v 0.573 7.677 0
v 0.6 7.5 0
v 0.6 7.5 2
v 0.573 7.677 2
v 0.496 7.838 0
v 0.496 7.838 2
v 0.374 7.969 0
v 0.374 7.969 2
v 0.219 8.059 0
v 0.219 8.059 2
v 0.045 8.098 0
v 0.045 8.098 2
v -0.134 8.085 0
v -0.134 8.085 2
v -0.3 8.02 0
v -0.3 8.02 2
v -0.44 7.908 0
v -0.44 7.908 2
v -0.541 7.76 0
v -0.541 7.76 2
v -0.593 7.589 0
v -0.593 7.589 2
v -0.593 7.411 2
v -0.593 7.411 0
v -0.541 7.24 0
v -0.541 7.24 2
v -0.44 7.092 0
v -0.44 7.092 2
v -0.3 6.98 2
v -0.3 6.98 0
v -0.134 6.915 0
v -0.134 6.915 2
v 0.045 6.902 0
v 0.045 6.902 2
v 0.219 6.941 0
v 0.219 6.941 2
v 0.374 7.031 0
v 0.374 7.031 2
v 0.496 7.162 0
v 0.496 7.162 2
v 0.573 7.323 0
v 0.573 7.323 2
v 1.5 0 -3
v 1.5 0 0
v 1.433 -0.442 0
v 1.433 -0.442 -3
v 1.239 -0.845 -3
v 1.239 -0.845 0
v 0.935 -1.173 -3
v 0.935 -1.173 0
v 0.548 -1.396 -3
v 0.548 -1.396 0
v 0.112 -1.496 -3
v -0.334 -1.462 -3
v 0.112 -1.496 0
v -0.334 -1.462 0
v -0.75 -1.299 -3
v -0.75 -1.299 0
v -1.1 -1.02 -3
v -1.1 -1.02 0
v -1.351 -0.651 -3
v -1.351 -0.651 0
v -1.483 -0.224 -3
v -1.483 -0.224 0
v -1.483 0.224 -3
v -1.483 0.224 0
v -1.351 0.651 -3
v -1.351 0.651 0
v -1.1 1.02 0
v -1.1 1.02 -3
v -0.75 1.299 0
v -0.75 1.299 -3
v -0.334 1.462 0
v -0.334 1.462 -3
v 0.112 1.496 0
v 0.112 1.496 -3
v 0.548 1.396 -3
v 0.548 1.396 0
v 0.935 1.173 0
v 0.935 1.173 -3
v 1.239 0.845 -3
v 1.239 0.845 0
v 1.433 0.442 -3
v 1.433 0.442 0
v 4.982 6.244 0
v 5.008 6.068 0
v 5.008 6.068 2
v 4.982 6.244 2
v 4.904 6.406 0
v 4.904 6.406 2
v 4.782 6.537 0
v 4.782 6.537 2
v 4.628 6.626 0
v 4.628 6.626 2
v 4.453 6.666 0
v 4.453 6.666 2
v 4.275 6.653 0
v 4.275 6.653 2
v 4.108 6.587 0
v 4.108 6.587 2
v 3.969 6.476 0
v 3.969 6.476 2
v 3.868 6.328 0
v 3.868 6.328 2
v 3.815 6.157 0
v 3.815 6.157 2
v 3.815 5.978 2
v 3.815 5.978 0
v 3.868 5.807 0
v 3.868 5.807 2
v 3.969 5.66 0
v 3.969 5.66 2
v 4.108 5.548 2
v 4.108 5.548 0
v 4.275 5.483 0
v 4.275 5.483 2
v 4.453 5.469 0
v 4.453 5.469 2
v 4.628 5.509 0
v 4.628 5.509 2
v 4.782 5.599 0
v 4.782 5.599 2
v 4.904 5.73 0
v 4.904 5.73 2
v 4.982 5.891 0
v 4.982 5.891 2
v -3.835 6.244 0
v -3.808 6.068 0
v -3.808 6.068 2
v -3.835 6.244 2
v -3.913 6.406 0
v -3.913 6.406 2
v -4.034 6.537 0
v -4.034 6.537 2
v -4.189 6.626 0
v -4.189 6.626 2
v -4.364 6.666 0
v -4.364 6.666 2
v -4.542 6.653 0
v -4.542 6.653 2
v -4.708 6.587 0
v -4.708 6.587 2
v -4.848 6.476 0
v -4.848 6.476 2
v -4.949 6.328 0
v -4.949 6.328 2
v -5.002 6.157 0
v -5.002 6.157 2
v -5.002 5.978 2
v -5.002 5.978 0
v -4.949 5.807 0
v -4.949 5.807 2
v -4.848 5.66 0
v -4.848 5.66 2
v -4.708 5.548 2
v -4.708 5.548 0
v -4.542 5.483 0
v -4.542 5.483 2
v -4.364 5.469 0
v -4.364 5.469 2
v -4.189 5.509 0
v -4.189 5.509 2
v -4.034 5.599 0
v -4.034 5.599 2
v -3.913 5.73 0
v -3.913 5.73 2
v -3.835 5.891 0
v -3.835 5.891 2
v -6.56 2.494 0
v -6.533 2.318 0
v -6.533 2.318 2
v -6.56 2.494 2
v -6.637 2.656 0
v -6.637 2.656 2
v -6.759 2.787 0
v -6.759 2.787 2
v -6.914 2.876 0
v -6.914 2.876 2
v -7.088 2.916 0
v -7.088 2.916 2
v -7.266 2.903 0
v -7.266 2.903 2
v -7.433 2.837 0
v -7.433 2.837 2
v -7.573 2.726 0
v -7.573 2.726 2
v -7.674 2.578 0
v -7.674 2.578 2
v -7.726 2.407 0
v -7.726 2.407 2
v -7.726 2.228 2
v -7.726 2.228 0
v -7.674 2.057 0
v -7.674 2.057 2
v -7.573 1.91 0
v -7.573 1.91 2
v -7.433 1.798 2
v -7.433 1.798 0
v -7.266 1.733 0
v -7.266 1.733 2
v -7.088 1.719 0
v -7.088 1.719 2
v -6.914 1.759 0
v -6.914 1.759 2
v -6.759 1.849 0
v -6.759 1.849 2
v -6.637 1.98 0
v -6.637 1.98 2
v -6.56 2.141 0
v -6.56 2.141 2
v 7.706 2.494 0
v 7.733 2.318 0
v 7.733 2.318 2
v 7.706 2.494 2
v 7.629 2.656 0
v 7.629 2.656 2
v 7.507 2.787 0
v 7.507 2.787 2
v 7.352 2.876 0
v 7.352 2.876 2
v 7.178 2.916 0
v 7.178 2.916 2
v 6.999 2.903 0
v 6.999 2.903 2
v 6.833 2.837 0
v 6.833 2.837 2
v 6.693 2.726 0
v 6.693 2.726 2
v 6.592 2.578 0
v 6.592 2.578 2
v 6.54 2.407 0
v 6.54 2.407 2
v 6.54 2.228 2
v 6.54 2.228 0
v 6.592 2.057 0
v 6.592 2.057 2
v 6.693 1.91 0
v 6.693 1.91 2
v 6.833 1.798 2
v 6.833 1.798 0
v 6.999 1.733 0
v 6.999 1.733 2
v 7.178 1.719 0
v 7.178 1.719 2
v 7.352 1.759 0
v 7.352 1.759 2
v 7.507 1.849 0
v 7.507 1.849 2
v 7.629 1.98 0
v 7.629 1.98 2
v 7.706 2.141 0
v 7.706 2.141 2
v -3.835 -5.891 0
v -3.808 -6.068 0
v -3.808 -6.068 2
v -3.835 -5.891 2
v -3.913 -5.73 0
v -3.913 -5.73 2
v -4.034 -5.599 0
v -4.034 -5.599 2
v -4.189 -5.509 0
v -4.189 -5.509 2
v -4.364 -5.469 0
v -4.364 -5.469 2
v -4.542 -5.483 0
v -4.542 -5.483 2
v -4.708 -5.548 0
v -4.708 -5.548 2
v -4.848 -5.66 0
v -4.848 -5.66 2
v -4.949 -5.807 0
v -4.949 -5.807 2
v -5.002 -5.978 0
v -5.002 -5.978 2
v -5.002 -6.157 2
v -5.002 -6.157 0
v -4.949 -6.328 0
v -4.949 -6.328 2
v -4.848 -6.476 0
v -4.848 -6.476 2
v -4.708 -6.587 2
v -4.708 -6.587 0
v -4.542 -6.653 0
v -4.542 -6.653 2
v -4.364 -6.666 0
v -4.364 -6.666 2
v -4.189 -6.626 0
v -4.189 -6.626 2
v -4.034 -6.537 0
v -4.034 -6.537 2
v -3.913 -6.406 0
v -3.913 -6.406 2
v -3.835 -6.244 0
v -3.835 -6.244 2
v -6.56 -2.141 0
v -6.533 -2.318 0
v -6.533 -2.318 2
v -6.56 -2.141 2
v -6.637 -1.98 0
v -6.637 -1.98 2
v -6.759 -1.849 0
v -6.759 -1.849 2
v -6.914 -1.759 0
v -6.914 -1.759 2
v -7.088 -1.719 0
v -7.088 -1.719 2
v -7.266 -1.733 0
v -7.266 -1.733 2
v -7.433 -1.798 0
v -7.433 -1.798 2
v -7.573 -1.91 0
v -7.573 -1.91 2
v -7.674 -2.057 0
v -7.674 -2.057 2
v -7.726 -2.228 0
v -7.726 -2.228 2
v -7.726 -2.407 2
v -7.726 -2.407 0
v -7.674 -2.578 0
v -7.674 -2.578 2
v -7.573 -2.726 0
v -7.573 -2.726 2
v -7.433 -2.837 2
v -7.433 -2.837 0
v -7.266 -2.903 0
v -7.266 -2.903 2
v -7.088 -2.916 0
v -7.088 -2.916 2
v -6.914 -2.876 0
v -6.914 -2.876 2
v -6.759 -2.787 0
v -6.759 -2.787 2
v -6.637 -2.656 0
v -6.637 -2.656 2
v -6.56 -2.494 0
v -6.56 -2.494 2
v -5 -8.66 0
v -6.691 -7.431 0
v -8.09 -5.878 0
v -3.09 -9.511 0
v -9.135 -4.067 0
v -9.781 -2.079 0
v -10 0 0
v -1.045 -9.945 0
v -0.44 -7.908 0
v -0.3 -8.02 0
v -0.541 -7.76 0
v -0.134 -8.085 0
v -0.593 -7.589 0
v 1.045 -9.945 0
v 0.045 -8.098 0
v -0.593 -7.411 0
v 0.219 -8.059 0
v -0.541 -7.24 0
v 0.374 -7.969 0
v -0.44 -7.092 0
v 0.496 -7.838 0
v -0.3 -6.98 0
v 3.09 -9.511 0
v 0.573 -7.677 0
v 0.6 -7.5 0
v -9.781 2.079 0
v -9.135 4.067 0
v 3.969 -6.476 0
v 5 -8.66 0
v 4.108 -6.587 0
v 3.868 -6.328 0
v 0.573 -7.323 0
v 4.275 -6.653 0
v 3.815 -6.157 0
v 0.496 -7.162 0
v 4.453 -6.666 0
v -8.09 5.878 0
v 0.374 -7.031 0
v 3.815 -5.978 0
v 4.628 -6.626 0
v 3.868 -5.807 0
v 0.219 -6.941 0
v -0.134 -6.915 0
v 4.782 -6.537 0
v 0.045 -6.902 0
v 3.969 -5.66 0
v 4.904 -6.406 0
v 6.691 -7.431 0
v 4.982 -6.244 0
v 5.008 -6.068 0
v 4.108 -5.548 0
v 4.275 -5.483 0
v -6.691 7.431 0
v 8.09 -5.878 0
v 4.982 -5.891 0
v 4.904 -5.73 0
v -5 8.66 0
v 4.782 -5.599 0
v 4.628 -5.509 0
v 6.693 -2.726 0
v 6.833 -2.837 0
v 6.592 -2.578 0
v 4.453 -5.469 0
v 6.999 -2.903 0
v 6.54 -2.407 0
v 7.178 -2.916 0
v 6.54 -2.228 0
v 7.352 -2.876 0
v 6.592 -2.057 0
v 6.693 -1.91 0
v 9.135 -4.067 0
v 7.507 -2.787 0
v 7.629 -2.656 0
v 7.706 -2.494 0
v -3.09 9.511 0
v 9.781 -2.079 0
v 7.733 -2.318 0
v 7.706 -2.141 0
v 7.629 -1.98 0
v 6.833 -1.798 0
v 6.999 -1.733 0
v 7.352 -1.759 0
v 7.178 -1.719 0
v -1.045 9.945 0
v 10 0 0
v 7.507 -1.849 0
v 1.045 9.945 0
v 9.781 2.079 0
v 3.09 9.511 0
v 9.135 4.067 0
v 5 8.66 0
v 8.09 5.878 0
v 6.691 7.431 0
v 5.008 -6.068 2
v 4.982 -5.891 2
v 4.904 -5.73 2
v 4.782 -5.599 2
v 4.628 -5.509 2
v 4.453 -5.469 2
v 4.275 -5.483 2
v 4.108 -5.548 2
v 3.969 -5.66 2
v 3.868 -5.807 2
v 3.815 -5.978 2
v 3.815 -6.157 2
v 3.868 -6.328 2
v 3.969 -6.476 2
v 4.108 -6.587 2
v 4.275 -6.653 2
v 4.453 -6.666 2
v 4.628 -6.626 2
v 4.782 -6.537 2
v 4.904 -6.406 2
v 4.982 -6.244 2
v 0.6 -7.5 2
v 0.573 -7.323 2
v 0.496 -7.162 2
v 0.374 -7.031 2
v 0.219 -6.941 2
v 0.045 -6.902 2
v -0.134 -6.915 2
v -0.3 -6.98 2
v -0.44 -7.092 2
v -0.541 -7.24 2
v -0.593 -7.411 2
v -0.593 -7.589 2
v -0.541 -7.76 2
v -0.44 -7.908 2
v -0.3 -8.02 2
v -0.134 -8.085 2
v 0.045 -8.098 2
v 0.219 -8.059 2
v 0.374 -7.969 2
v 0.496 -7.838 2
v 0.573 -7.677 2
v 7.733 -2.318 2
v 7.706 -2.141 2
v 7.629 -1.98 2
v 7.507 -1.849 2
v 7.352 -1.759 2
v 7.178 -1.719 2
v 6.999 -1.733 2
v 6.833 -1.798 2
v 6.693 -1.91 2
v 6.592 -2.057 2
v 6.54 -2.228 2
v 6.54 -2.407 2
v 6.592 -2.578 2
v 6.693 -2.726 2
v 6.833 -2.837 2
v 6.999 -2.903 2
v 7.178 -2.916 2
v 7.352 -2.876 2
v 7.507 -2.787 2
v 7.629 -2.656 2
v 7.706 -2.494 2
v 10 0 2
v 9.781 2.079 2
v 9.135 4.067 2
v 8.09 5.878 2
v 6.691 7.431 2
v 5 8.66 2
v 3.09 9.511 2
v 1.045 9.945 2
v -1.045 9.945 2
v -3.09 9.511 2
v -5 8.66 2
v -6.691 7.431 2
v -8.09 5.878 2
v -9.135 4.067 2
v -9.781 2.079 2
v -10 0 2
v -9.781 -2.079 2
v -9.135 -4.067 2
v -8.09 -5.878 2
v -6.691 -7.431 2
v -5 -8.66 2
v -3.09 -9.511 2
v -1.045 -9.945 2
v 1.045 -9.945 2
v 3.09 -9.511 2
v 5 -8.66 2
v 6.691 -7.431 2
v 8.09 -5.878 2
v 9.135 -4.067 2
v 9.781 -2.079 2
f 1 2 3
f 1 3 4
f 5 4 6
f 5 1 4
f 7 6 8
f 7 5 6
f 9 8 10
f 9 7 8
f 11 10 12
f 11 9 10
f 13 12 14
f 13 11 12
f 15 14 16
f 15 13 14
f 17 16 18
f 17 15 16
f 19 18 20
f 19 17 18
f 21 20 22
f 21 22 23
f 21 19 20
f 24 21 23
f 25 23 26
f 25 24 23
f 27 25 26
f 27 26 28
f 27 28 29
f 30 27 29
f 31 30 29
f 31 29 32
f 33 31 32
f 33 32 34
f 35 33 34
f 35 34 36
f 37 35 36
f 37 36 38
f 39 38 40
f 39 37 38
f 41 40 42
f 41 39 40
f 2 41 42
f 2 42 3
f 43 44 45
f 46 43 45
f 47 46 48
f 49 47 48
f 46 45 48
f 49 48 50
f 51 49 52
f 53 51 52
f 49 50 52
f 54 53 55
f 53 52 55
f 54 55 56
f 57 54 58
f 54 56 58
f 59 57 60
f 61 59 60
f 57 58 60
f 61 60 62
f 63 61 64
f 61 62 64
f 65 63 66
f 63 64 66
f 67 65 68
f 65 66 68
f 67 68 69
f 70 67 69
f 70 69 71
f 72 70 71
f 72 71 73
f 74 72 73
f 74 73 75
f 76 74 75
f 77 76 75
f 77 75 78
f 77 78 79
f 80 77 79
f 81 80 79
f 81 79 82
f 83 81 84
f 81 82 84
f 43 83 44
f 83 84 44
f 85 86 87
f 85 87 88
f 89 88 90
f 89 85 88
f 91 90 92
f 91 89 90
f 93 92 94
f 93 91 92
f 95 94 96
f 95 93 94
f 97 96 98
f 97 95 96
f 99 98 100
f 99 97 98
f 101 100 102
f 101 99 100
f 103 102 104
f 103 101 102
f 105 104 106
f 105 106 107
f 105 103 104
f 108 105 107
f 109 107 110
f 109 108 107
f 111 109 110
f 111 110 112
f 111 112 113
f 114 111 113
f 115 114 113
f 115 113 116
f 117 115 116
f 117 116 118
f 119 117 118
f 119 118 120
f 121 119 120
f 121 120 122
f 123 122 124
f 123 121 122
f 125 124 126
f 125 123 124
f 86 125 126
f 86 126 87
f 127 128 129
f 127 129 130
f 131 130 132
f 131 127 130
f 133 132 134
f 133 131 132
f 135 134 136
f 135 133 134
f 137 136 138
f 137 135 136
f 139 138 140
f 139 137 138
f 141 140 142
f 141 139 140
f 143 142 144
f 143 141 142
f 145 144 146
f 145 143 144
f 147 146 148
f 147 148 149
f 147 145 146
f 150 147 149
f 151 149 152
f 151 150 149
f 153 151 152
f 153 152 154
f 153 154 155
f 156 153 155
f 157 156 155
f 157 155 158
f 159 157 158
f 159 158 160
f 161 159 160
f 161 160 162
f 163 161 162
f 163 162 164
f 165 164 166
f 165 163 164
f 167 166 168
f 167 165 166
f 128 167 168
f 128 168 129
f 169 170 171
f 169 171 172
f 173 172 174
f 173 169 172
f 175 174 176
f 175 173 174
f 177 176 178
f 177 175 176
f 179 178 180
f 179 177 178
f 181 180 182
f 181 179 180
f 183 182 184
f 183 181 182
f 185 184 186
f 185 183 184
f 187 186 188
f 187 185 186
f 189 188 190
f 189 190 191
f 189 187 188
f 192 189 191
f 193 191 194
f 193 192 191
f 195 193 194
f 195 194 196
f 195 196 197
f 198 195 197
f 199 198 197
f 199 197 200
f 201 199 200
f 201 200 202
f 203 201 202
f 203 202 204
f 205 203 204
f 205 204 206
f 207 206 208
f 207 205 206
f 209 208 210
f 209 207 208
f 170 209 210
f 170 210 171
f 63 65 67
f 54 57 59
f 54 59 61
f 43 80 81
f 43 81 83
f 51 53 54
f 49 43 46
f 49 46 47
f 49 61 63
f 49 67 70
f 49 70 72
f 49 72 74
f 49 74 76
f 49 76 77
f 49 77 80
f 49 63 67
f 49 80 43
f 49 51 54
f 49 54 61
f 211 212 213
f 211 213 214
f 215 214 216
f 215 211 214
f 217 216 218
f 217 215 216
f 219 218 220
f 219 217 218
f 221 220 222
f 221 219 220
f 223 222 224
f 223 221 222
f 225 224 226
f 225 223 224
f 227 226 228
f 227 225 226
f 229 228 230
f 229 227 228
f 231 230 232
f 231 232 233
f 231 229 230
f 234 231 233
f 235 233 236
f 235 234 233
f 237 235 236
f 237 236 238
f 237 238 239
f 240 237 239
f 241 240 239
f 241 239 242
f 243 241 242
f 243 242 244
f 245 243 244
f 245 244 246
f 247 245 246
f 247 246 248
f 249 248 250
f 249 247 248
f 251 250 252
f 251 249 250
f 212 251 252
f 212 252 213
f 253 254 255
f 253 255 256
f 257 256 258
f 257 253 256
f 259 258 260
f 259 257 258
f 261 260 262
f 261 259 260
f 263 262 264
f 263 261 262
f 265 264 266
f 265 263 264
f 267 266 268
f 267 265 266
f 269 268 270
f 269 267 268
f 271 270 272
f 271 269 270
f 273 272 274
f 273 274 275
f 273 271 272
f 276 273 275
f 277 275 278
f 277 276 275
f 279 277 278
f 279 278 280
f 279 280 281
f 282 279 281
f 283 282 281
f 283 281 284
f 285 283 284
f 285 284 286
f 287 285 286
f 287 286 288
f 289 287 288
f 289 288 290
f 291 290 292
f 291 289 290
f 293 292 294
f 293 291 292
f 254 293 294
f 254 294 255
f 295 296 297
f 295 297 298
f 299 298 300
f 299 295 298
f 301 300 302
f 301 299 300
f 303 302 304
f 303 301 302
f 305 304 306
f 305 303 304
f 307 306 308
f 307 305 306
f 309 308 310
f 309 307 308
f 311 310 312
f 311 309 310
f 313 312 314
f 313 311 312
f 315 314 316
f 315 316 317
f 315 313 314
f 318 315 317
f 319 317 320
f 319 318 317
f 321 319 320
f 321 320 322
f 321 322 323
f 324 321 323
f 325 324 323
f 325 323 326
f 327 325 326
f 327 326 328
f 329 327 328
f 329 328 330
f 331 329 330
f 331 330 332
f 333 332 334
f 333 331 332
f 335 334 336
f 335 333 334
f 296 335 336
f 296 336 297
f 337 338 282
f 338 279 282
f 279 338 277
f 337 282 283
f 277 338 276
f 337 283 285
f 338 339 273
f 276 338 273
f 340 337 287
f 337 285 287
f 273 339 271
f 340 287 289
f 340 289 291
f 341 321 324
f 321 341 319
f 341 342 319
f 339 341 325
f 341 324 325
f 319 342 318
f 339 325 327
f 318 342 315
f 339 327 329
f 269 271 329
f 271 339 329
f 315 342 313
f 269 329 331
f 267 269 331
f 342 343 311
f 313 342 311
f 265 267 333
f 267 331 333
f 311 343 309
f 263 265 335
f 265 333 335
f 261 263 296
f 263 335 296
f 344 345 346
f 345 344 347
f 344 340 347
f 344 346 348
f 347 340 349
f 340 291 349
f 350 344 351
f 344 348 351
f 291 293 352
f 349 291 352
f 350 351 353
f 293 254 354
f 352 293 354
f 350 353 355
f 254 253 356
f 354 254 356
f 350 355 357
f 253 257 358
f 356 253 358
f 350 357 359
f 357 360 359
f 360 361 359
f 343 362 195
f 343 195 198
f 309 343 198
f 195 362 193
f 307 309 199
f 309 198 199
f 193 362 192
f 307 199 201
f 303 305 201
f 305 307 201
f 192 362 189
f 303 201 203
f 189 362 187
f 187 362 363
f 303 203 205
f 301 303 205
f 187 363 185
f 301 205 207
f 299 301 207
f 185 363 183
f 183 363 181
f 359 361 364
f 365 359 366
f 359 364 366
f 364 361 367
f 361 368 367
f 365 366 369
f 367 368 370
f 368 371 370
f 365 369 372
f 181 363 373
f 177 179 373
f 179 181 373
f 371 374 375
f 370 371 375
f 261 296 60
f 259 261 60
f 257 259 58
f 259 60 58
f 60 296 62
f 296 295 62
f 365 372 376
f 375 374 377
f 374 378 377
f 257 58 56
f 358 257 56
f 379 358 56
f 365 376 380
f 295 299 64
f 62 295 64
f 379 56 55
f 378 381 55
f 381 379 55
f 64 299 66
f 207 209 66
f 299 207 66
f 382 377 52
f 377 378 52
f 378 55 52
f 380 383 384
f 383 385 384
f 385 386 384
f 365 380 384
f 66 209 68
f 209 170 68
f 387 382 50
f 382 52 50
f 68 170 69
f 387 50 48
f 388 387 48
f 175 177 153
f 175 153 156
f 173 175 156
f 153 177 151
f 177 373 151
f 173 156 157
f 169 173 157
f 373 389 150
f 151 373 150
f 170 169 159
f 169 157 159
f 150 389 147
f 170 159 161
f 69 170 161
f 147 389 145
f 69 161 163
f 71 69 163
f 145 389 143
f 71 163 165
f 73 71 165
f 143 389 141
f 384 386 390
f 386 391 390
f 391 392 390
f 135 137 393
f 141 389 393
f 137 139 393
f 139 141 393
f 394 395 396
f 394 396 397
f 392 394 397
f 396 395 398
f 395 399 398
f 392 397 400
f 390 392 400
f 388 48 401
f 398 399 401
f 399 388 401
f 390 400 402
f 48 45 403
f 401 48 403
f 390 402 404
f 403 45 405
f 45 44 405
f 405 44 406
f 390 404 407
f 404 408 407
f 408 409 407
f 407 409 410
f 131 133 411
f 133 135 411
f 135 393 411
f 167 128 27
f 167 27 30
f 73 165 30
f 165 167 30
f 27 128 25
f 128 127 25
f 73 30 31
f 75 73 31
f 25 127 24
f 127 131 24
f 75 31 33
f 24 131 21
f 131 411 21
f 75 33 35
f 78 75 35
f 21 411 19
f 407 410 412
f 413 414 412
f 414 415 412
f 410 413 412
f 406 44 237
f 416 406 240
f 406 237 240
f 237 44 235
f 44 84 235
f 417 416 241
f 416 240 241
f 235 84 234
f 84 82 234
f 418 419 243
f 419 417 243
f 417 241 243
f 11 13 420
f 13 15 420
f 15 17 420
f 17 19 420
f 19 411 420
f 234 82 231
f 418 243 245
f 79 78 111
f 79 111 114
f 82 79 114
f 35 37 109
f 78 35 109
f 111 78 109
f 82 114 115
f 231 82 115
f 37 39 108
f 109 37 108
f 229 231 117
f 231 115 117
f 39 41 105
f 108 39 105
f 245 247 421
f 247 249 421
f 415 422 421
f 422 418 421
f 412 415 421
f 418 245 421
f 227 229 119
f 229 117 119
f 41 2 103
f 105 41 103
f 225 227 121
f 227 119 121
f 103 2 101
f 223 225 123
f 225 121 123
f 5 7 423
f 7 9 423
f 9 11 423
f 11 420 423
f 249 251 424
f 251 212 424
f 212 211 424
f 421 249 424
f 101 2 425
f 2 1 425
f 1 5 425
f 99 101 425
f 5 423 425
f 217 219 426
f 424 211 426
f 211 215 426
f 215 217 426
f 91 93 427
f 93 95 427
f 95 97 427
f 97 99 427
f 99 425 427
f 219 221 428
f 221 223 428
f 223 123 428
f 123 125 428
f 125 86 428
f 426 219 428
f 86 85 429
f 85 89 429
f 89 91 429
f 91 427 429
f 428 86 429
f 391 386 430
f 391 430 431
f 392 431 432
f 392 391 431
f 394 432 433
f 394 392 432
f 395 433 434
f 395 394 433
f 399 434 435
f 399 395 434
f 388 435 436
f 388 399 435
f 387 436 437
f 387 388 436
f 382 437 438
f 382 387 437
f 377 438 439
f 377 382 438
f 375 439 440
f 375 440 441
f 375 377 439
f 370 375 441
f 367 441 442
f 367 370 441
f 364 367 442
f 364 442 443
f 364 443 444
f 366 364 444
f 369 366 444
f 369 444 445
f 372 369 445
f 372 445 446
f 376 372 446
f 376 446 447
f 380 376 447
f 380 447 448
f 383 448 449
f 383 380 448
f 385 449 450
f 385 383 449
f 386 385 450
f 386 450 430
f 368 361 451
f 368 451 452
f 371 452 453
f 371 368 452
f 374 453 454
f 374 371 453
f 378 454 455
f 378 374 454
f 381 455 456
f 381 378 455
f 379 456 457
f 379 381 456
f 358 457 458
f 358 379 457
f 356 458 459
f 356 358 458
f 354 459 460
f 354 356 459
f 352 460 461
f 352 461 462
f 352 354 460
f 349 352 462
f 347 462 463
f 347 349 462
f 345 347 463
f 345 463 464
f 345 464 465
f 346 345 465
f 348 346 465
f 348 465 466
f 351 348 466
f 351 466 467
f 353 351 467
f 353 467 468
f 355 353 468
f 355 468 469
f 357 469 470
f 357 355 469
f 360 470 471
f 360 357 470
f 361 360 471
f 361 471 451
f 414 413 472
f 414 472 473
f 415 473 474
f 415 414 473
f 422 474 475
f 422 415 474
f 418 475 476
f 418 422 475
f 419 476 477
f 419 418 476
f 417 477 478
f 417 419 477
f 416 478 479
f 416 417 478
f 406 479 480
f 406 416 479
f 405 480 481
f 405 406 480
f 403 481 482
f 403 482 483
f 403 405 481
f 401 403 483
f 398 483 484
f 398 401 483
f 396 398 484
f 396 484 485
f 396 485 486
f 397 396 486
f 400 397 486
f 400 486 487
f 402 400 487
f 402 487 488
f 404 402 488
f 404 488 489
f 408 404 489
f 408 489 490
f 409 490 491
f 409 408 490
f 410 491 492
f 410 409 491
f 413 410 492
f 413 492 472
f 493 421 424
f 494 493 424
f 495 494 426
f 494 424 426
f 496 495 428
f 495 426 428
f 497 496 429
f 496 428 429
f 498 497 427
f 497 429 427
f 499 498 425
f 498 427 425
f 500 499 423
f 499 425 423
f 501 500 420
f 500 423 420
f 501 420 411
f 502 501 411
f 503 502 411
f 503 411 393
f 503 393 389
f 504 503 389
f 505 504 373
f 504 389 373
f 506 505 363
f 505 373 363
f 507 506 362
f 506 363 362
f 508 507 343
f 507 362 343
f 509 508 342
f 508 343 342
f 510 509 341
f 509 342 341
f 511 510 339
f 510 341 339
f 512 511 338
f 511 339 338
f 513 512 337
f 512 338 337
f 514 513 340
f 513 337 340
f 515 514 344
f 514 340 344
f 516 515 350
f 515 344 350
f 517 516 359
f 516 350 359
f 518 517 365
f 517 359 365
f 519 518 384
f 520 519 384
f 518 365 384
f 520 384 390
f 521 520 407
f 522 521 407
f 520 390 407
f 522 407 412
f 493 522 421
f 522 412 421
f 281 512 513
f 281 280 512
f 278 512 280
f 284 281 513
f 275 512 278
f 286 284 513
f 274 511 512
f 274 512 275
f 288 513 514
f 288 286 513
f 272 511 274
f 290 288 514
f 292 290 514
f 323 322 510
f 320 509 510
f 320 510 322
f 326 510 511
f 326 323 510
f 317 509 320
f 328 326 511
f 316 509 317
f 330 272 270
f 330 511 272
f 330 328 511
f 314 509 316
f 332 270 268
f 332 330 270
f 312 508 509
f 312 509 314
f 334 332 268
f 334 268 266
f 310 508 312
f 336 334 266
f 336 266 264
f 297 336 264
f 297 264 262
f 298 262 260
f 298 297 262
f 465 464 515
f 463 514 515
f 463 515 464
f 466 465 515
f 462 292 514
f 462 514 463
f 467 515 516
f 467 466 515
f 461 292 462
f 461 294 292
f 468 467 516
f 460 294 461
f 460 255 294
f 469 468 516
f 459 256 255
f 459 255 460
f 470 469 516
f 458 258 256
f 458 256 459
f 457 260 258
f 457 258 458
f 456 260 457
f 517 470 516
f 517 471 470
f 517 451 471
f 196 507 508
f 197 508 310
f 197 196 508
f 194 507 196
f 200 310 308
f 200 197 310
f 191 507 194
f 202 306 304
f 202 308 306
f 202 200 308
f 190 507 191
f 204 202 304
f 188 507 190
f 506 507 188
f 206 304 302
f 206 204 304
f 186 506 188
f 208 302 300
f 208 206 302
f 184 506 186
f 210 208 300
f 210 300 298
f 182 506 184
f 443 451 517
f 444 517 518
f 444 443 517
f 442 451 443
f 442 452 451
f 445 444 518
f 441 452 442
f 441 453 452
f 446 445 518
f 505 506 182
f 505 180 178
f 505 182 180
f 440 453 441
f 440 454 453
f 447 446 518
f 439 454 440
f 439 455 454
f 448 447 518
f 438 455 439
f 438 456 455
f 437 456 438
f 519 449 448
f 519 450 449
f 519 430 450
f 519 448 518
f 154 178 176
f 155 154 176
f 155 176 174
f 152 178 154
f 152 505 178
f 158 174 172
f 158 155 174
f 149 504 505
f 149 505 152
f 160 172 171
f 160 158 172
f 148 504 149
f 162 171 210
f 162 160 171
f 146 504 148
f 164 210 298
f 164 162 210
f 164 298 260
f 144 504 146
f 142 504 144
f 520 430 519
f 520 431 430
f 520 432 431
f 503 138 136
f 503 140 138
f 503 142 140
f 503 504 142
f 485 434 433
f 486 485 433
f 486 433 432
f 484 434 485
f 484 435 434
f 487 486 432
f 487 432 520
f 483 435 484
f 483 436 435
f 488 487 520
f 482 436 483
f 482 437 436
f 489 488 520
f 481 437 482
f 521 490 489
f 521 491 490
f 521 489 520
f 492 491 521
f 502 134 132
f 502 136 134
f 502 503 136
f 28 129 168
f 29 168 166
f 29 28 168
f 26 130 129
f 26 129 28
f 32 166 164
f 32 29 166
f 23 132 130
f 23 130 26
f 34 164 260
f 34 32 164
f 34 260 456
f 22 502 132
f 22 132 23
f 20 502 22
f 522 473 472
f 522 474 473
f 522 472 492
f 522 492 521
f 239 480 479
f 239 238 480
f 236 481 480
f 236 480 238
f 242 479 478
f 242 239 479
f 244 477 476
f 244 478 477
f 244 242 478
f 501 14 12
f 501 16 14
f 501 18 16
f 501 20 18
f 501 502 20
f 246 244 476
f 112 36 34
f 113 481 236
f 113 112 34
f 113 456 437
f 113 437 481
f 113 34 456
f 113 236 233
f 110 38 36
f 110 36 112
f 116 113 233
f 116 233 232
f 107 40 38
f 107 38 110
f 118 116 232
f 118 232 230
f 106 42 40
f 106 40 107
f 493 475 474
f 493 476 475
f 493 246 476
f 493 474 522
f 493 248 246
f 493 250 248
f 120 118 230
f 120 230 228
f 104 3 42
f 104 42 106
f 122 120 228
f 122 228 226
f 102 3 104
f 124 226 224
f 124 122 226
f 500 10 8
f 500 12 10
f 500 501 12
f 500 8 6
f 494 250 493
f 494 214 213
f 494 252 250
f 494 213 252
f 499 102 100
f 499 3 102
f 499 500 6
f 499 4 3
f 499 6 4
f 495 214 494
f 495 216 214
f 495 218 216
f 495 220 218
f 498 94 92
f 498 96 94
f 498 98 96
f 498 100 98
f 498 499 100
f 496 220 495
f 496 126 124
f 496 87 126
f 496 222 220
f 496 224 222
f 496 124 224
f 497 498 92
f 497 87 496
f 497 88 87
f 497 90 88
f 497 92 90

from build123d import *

# Parameters (mm, degrees)
SKETCH_1_R      = 10
SKETCH_1_R_2    = 0.6
EXTRUDE_1_DEPTH = 2
SKETCH_2_R      = 1.5
EXTRUDE_2_DEPTH = 3


with BuildPart() as part:
    # 草圖1 → 填料-伸長1 (new body)
    with BuildSketch(Plane.XY):
        Circle(SKETCH_1_R)
        with Locations((4.408389392, 6.067627458)):
            Circle(SKETCH_1_R_2, mode=Mode.SUBTRACT)
        with Locations((0, 7.5)):
            Circle(SKETCH_1_R_2, mode=Mode.SUBTRACT)
        with Locations((7.132923872, 2.317627458)):
            Circle(SKETCH_1_R_2, mode=Mode.SUBTRACT)
        with Locations((7.132923872, -2.317627458)):
            Circle(SKETCH_1_R_2, mode=Mode.SUBTRACT)
        with Locations((4.408389392, -6.067627458)):
            Circle(SKETCH_1_R_2, mode=Mode.SUBTRACT)
        with Locations((0, -7.5)):
            Circle(SKETCH_1_R_2, mode=Mode.SUBTRACT)
        with Locations((-4.408389392, -6.067627458)):
            Circle(SKETCH_1_R_2, mode=Mode.SUBTRACT)
        with Locations((-7.132923872, -2.317627458)):
            Circle(SKETCH_1_R_2, mode=Mode.SUBTRACT)
        with Locations((-7.132923872, 2.317627458)):
            Circle(SKETCH_1_R_2, mode=Mode.SUBTRACT)
        with Locations((-4.408389392, 6.067627458)):
            Circle(SKETCH_1_R_2, mode=Mode.SUBTRACT)
    extrude(amount=EXTRUDE_1_DEPTH)

    # 草圖2 → 填料-伸長2 (add)
    with BuildSketch(Plane(origin=(0, 0, 0), x_dir=(-1, 0, 0), z_dir=(0, 0, -1))):
        with Locations(Location((0, 0, 0), (0, 0, 180))):
            Circle(SKETCH_2_R)
    extrude(amount=EXTRUDE_2_DEPTH)


solid = part.part
